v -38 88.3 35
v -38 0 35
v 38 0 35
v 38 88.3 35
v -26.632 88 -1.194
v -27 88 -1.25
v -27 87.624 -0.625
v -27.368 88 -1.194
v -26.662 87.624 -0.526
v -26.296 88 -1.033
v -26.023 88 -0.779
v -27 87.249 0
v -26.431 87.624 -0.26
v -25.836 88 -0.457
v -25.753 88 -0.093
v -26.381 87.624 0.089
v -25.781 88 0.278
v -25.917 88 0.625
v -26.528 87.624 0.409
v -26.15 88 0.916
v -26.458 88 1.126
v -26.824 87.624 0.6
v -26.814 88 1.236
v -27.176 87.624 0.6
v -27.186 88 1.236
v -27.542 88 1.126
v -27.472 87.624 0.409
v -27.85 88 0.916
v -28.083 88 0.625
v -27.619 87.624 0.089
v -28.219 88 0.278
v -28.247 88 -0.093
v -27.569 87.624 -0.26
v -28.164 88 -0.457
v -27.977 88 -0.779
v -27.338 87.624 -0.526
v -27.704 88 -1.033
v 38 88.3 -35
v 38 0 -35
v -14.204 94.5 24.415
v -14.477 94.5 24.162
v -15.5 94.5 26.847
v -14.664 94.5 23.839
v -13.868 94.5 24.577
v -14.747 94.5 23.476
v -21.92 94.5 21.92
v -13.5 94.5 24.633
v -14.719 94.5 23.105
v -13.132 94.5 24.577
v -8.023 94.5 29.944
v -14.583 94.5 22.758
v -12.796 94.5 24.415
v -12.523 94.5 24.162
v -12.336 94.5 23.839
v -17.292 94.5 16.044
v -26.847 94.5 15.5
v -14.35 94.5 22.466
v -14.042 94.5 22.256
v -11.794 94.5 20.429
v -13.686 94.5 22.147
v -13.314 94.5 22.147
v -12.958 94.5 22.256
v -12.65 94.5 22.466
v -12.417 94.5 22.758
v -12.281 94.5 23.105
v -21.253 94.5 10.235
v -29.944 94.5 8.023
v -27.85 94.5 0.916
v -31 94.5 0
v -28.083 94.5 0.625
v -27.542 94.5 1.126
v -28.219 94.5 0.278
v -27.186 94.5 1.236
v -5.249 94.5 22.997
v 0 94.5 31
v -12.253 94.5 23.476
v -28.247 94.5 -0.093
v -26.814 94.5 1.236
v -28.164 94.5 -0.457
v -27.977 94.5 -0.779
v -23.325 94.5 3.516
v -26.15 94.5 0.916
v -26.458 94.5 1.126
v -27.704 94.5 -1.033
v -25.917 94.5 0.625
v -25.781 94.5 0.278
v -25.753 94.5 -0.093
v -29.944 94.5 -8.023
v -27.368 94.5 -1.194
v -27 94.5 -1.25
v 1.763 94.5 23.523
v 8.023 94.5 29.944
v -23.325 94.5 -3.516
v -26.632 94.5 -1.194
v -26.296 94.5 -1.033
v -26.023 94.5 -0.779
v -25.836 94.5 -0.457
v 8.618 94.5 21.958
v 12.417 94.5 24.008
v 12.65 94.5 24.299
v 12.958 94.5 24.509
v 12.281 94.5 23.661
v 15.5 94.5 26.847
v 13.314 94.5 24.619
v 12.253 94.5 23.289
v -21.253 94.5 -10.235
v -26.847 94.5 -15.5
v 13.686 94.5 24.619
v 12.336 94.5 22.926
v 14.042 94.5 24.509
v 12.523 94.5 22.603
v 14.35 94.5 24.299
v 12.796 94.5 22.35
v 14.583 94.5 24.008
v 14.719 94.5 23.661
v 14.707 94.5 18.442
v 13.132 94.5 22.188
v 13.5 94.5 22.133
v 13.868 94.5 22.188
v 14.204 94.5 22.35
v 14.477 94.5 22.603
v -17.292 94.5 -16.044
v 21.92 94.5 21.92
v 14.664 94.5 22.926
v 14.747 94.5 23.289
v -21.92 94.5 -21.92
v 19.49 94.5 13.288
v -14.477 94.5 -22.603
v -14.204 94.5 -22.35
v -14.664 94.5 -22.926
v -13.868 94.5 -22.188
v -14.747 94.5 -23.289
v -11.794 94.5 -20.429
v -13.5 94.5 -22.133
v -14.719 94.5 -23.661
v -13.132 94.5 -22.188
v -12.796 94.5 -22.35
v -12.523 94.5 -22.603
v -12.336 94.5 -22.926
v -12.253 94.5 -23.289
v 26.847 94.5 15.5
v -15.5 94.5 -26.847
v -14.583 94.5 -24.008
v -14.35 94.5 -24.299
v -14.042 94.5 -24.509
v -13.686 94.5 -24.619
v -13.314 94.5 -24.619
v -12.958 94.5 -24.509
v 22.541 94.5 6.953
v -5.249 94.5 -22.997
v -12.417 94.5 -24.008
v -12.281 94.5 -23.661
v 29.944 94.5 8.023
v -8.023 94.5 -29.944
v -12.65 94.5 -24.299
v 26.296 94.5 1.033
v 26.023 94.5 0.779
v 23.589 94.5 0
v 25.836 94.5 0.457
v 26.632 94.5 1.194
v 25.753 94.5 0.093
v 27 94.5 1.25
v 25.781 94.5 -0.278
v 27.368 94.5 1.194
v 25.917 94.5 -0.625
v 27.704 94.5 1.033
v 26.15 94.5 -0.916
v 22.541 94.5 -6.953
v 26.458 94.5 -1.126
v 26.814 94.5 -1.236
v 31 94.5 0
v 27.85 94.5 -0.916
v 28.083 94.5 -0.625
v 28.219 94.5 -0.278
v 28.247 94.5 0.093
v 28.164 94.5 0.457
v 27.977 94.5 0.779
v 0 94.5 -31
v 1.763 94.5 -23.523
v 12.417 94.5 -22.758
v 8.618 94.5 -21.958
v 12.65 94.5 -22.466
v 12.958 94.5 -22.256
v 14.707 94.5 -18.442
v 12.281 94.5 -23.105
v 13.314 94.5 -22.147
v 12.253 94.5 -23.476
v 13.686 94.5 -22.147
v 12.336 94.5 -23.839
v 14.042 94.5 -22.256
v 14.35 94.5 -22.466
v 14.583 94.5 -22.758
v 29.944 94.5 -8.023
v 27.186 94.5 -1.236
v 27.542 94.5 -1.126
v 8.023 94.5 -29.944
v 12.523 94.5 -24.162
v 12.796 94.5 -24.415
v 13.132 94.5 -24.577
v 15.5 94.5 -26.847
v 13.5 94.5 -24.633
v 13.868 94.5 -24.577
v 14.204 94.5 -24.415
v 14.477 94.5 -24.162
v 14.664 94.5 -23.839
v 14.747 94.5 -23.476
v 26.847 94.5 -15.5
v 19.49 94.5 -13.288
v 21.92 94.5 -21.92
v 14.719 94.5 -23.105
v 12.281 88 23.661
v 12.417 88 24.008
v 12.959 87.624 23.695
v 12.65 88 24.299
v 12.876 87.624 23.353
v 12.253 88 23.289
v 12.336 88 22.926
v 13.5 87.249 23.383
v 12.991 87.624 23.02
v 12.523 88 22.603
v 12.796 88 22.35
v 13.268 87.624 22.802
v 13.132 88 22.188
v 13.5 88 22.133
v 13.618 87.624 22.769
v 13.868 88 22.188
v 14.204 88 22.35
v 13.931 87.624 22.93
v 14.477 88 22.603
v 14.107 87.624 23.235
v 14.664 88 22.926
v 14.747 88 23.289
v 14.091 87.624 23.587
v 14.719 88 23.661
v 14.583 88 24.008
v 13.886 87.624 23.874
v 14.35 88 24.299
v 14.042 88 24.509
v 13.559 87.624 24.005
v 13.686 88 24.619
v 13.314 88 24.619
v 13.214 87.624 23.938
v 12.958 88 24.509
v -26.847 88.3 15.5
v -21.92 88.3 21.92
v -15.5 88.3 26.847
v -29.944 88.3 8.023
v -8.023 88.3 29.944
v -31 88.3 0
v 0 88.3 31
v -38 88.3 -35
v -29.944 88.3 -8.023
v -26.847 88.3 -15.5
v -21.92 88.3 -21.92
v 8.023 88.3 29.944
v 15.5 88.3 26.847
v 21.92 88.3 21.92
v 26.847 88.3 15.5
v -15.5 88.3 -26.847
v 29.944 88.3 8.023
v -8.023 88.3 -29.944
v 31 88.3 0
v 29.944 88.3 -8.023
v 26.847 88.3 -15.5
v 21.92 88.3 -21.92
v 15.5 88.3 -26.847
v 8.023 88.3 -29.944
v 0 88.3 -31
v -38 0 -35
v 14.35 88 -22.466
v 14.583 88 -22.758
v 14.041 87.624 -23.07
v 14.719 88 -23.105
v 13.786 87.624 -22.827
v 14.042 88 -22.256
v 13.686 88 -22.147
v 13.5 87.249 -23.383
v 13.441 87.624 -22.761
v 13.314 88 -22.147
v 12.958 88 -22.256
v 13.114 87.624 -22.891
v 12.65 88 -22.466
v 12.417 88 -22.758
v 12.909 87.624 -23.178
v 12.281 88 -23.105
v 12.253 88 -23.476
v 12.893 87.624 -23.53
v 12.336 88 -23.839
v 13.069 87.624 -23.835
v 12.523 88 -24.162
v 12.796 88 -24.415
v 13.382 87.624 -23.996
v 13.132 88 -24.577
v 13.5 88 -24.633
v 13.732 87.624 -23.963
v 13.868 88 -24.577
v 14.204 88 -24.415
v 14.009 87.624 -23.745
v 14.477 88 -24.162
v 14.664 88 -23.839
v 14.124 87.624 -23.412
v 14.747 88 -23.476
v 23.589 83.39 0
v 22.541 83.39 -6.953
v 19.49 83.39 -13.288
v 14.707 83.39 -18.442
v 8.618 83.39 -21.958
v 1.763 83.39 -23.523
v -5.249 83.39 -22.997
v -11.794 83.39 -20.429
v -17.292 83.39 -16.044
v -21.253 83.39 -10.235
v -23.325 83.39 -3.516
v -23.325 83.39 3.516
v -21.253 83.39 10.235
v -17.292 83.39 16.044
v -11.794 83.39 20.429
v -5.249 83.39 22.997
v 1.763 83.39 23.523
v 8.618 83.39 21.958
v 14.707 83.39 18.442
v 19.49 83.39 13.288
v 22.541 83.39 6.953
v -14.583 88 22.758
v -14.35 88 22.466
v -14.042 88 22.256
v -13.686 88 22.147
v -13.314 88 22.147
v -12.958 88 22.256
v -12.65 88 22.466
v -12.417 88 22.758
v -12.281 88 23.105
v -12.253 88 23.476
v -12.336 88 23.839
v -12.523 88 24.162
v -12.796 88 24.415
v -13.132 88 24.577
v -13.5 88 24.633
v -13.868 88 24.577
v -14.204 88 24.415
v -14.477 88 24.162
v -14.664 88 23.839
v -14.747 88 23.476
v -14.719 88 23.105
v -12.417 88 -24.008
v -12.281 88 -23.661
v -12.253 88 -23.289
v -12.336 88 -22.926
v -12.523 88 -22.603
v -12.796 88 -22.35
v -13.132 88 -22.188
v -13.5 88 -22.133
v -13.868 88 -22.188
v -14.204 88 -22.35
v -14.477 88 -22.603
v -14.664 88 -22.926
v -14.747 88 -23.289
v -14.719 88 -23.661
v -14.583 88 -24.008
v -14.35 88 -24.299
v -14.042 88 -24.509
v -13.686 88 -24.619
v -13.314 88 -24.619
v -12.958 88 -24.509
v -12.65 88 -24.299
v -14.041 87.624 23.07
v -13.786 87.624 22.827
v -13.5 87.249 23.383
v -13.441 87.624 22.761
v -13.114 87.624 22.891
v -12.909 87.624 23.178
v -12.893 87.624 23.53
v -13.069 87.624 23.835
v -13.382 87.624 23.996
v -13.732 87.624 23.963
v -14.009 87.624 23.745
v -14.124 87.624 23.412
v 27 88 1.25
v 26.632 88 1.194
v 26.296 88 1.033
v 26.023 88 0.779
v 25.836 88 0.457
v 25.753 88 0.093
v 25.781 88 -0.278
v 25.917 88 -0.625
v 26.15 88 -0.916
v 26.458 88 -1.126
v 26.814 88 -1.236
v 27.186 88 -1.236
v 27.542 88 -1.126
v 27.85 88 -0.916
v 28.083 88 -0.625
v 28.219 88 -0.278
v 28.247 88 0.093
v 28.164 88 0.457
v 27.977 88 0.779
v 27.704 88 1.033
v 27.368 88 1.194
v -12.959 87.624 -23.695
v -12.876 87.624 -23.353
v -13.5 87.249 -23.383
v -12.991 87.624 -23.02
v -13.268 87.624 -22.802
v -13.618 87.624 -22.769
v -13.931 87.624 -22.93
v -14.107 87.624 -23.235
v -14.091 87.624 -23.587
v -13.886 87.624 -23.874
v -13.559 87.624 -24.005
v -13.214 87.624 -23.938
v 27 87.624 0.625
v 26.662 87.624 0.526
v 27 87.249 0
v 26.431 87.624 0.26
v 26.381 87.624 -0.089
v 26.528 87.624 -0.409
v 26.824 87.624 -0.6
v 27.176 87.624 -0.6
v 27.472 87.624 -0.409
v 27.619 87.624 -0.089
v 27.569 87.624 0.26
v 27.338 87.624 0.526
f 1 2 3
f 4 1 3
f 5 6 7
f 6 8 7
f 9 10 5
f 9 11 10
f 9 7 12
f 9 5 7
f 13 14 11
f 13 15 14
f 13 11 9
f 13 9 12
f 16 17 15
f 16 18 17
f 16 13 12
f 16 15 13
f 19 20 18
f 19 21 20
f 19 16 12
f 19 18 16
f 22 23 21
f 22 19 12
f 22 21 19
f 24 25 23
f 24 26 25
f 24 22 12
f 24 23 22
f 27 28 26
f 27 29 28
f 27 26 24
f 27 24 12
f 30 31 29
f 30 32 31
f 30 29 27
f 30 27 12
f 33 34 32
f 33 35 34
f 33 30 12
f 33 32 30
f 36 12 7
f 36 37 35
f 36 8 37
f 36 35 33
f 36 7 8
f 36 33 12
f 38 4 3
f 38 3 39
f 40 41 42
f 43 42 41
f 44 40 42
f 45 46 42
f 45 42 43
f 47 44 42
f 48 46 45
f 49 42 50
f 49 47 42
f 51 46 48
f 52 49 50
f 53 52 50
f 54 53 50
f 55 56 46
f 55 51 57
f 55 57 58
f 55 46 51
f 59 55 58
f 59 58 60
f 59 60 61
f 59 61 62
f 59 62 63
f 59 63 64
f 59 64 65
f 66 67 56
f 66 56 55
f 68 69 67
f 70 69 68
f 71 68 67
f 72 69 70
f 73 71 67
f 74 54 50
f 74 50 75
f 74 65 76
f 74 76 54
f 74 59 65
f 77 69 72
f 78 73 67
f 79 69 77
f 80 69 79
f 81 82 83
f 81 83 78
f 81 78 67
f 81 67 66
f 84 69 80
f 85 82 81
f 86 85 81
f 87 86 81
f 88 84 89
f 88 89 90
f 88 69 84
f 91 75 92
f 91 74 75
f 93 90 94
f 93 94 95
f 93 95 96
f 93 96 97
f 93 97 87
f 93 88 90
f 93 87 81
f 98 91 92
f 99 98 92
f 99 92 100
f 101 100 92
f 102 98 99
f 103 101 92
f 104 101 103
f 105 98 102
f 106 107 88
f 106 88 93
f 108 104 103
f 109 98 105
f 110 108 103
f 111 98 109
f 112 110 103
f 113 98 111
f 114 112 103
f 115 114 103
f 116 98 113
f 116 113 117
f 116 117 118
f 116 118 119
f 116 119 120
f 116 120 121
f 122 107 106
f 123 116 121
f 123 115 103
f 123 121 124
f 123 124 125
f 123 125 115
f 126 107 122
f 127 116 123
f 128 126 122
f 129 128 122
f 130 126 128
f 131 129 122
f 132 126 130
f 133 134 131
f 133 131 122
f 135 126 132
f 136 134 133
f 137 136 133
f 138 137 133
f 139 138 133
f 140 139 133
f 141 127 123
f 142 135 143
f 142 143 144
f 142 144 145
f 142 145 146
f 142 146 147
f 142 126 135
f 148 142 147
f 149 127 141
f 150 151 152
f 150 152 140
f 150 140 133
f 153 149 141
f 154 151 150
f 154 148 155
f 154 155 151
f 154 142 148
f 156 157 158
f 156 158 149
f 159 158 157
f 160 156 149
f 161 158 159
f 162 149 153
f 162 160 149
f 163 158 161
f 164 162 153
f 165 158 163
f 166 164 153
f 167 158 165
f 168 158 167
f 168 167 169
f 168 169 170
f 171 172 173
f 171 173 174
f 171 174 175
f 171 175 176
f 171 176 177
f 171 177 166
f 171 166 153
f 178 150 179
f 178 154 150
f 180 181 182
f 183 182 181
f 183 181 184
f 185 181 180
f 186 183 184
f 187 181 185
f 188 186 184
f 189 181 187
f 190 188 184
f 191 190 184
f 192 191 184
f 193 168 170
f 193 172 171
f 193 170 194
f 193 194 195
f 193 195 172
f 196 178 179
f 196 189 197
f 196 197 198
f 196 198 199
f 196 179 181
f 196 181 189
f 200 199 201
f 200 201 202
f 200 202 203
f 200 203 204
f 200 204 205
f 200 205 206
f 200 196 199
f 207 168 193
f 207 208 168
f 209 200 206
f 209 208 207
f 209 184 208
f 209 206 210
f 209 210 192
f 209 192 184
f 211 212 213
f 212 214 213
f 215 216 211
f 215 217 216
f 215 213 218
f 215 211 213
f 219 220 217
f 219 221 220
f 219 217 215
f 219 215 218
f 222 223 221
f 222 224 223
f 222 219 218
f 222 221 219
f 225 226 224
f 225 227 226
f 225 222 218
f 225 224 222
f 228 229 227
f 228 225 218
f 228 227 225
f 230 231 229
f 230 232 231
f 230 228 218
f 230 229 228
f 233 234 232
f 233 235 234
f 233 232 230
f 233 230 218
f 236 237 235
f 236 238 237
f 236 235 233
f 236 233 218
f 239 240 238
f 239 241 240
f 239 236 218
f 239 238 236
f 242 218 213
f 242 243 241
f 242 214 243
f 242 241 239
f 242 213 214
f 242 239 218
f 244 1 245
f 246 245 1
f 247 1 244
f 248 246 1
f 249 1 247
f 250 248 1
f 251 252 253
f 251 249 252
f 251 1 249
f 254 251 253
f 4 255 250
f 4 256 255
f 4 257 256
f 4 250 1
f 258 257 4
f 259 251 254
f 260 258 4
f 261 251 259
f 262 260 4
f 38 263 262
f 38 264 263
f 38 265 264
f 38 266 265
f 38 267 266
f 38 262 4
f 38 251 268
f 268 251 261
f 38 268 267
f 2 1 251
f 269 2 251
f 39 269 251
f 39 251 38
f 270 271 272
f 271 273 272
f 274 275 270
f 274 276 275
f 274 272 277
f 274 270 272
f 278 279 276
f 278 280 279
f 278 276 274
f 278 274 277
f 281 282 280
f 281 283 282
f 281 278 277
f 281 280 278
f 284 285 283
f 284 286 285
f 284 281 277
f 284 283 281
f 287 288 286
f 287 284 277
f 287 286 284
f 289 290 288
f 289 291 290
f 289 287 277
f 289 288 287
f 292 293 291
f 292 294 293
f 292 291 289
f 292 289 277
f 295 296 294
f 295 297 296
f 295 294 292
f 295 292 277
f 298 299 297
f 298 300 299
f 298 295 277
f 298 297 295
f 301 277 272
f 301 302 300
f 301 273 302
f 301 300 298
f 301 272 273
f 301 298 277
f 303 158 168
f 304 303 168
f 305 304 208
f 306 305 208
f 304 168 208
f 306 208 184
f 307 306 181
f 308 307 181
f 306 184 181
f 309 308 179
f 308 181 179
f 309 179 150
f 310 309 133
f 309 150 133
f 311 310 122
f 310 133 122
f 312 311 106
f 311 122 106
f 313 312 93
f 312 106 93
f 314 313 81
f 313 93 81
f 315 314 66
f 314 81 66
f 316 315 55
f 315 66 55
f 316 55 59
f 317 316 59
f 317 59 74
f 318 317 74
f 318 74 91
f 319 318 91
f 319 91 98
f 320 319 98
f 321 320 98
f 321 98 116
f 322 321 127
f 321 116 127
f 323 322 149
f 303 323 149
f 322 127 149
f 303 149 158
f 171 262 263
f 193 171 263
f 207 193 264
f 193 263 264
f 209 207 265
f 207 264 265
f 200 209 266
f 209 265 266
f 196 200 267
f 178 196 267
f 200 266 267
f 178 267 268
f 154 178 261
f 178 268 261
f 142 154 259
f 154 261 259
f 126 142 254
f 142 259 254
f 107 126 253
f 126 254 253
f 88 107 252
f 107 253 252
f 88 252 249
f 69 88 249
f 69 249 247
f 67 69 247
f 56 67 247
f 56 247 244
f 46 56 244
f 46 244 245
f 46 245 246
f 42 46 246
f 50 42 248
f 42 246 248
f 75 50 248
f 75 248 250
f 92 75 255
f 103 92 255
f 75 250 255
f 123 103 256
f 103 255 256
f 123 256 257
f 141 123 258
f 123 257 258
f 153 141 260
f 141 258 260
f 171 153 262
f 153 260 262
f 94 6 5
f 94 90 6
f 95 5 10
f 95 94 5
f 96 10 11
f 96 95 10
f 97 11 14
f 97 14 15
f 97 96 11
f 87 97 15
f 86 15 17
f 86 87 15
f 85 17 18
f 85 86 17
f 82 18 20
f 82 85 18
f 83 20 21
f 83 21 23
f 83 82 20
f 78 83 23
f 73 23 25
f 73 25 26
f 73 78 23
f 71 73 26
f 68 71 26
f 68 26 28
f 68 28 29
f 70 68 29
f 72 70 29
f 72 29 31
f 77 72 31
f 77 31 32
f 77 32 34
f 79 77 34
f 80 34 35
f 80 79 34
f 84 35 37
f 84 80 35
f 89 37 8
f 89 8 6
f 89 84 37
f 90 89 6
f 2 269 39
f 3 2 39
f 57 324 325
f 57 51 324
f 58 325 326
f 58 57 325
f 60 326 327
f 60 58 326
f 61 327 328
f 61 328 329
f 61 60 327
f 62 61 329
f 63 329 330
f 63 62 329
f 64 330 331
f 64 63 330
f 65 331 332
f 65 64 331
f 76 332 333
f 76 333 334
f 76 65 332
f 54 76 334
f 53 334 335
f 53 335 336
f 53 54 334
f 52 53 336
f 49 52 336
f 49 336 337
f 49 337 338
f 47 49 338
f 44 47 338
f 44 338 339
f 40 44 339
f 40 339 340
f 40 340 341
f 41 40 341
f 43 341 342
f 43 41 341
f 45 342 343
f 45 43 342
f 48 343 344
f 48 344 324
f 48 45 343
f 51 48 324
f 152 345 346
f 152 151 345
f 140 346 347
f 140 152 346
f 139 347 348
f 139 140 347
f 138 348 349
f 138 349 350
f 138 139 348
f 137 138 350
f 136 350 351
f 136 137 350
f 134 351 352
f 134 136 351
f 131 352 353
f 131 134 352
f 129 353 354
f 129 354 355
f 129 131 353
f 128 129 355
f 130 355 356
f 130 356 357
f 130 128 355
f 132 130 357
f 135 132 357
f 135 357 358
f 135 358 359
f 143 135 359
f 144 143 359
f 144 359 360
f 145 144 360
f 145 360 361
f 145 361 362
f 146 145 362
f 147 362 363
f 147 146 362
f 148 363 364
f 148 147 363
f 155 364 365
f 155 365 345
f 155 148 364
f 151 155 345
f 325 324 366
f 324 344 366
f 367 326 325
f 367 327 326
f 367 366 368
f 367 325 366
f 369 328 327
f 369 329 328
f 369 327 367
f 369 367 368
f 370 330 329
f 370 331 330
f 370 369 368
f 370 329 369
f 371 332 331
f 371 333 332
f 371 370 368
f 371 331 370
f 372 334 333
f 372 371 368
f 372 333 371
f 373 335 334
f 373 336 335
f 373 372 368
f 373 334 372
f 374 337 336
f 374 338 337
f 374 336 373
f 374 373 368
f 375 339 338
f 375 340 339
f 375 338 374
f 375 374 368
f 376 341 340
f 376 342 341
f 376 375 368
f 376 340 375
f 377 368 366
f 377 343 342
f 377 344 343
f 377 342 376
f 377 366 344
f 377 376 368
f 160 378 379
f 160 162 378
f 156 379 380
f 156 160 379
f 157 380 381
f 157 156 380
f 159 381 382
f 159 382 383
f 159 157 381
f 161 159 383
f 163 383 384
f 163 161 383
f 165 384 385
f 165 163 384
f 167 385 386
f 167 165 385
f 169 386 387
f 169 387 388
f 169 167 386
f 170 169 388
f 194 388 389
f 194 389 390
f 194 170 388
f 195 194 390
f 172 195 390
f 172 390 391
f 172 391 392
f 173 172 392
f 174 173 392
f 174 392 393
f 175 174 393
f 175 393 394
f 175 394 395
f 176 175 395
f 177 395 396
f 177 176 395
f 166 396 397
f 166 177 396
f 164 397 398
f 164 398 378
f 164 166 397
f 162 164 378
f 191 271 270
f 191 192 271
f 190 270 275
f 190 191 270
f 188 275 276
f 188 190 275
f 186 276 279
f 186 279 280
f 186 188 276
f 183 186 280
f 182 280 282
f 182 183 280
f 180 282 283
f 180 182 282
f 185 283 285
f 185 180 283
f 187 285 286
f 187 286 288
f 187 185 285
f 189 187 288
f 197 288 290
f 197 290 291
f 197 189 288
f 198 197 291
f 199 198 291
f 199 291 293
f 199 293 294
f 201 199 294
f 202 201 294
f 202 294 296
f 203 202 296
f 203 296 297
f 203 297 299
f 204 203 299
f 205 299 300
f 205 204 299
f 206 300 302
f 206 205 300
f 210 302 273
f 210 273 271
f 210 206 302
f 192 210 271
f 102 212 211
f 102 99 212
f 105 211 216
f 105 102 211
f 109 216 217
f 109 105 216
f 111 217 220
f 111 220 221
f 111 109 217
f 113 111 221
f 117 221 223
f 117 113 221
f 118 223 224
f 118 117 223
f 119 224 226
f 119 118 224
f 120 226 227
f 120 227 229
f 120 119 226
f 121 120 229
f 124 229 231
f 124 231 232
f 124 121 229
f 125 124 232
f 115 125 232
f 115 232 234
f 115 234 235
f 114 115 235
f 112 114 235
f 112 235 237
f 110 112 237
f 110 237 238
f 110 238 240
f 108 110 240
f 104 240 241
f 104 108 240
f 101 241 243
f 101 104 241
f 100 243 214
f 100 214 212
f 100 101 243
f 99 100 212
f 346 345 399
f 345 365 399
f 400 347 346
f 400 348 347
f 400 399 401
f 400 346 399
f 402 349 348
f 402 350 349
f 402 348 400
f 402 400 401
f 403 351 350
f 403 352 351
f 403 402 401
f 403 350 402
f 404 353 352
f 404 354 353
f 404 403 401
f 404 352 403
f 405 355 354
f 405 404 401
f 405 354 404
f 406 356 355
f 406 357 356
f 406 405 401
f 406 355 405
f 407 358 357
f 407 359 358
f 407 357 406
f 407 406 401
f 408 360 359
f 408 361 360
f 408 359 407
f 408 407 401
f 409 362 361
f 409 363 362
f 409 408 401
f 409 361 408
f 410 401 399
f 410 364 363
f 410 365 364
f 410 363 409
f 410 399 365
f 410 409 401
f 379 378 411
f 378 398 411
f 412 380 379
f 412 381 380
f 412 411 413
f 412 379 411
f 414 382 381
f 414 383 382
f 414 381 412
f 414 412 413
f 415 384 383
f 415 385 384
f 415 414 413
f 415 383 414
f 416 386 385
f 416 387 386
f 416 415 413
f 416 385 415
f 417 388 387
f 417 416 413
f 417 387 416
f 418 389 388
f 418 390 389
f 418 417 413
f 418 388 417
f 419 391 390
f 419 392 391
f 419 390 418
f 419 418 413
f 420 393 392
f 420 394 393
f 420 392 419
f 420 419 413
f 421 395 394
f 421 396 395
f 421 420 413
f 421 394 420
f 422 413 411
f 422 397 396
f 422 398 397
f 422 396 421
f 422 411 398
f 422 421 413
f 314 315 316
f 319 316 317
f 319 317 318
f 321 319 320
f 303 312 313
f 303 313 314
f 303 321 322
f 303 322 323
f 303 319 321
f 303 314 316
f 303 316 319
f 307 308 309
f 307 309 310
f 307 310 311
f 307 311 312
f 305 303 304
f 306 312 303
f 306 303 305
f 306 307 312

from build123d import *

# Parameters (mm, degrees)
SKETCH1_W           = 76
SKETCH1_H           = 70
BOSS_EXTRUDE1_DEPTH = 88.3
SKETCH2_R           = 31
BOSS_EXTRUDE2_DEPTH = 6.2
CIRPATTERN1_COUNT   = 6
SKETCH8_R           = 23.588802374
CUT_EXTRUDE1_DEPTH  = 11.11


with BuildPart() as part:
    # Sketch1 → Boss-Extrude1 (new body)
    with BuildSketch(Plane(origin=(0, 0, 0), x_dir=(1, 0, 0), z_dir=(0, 1, 0))):
        Rectangle(SKETCH1_W, SKETCH1_H)
    extrude(amount=BOSS_EXTRUDE1_DEPTH)

    # Sketch2 → Boss-Extrude2 (add)
    with BuildSketch(Plane(origin=(0, 88.3, 0), x_dir=(1, 0, 0), z_dir=(0, 1, 0))):
        Circle(SKETCH2_R)
    extrude(amount=BOSS_EXTRUDE2_DEPTH)

    # Sketch7 → M3x0.5 Tapped Hole3 (revolve, cut)
    with BuildSketch(Plane(origin=(27, 94.5, 0), x_dir=(0, 0, 1), z_dir=(1, 0, 0))):
        Polygon((0, 0), (0, 7.251075774), (1.25, 6.5), (1.25, 0), align=None)
    m3x0_5_tapped_hole3 = revolve(axis=Axis((27, 100.85, 0), (0, -1, 0)), mode=Mode.SUBTRACT)

    # CirPattern1: M3x0.5 Tapped Hole3 ×6 about axis
    cirpattern1_axis = Axis((0, 112.582788709, 0), (0, -1, 0))
    for i in range(1, CIRPATTERN1_COUNT):
        add(m3x0_5_tapped_hole3.rotate(cirpattern1_axis, i * 360 / CIRPATTERN1_COUNT), mode=Mode.SUBTRACT)

    # Sketch8 → Cut-Extrude1 (cut)
    with BuildSketch(Plane(origin=(0, 94.5, 0), x_dir=(1, 0, 0), z_dir=(0, 1, 0))):
        Circle(SKETCH8_R)
    extrude(amount=-CUT_EXTRUDE1_DEPTH, mode=Mode.SUBTRACT)


solid = part.part
